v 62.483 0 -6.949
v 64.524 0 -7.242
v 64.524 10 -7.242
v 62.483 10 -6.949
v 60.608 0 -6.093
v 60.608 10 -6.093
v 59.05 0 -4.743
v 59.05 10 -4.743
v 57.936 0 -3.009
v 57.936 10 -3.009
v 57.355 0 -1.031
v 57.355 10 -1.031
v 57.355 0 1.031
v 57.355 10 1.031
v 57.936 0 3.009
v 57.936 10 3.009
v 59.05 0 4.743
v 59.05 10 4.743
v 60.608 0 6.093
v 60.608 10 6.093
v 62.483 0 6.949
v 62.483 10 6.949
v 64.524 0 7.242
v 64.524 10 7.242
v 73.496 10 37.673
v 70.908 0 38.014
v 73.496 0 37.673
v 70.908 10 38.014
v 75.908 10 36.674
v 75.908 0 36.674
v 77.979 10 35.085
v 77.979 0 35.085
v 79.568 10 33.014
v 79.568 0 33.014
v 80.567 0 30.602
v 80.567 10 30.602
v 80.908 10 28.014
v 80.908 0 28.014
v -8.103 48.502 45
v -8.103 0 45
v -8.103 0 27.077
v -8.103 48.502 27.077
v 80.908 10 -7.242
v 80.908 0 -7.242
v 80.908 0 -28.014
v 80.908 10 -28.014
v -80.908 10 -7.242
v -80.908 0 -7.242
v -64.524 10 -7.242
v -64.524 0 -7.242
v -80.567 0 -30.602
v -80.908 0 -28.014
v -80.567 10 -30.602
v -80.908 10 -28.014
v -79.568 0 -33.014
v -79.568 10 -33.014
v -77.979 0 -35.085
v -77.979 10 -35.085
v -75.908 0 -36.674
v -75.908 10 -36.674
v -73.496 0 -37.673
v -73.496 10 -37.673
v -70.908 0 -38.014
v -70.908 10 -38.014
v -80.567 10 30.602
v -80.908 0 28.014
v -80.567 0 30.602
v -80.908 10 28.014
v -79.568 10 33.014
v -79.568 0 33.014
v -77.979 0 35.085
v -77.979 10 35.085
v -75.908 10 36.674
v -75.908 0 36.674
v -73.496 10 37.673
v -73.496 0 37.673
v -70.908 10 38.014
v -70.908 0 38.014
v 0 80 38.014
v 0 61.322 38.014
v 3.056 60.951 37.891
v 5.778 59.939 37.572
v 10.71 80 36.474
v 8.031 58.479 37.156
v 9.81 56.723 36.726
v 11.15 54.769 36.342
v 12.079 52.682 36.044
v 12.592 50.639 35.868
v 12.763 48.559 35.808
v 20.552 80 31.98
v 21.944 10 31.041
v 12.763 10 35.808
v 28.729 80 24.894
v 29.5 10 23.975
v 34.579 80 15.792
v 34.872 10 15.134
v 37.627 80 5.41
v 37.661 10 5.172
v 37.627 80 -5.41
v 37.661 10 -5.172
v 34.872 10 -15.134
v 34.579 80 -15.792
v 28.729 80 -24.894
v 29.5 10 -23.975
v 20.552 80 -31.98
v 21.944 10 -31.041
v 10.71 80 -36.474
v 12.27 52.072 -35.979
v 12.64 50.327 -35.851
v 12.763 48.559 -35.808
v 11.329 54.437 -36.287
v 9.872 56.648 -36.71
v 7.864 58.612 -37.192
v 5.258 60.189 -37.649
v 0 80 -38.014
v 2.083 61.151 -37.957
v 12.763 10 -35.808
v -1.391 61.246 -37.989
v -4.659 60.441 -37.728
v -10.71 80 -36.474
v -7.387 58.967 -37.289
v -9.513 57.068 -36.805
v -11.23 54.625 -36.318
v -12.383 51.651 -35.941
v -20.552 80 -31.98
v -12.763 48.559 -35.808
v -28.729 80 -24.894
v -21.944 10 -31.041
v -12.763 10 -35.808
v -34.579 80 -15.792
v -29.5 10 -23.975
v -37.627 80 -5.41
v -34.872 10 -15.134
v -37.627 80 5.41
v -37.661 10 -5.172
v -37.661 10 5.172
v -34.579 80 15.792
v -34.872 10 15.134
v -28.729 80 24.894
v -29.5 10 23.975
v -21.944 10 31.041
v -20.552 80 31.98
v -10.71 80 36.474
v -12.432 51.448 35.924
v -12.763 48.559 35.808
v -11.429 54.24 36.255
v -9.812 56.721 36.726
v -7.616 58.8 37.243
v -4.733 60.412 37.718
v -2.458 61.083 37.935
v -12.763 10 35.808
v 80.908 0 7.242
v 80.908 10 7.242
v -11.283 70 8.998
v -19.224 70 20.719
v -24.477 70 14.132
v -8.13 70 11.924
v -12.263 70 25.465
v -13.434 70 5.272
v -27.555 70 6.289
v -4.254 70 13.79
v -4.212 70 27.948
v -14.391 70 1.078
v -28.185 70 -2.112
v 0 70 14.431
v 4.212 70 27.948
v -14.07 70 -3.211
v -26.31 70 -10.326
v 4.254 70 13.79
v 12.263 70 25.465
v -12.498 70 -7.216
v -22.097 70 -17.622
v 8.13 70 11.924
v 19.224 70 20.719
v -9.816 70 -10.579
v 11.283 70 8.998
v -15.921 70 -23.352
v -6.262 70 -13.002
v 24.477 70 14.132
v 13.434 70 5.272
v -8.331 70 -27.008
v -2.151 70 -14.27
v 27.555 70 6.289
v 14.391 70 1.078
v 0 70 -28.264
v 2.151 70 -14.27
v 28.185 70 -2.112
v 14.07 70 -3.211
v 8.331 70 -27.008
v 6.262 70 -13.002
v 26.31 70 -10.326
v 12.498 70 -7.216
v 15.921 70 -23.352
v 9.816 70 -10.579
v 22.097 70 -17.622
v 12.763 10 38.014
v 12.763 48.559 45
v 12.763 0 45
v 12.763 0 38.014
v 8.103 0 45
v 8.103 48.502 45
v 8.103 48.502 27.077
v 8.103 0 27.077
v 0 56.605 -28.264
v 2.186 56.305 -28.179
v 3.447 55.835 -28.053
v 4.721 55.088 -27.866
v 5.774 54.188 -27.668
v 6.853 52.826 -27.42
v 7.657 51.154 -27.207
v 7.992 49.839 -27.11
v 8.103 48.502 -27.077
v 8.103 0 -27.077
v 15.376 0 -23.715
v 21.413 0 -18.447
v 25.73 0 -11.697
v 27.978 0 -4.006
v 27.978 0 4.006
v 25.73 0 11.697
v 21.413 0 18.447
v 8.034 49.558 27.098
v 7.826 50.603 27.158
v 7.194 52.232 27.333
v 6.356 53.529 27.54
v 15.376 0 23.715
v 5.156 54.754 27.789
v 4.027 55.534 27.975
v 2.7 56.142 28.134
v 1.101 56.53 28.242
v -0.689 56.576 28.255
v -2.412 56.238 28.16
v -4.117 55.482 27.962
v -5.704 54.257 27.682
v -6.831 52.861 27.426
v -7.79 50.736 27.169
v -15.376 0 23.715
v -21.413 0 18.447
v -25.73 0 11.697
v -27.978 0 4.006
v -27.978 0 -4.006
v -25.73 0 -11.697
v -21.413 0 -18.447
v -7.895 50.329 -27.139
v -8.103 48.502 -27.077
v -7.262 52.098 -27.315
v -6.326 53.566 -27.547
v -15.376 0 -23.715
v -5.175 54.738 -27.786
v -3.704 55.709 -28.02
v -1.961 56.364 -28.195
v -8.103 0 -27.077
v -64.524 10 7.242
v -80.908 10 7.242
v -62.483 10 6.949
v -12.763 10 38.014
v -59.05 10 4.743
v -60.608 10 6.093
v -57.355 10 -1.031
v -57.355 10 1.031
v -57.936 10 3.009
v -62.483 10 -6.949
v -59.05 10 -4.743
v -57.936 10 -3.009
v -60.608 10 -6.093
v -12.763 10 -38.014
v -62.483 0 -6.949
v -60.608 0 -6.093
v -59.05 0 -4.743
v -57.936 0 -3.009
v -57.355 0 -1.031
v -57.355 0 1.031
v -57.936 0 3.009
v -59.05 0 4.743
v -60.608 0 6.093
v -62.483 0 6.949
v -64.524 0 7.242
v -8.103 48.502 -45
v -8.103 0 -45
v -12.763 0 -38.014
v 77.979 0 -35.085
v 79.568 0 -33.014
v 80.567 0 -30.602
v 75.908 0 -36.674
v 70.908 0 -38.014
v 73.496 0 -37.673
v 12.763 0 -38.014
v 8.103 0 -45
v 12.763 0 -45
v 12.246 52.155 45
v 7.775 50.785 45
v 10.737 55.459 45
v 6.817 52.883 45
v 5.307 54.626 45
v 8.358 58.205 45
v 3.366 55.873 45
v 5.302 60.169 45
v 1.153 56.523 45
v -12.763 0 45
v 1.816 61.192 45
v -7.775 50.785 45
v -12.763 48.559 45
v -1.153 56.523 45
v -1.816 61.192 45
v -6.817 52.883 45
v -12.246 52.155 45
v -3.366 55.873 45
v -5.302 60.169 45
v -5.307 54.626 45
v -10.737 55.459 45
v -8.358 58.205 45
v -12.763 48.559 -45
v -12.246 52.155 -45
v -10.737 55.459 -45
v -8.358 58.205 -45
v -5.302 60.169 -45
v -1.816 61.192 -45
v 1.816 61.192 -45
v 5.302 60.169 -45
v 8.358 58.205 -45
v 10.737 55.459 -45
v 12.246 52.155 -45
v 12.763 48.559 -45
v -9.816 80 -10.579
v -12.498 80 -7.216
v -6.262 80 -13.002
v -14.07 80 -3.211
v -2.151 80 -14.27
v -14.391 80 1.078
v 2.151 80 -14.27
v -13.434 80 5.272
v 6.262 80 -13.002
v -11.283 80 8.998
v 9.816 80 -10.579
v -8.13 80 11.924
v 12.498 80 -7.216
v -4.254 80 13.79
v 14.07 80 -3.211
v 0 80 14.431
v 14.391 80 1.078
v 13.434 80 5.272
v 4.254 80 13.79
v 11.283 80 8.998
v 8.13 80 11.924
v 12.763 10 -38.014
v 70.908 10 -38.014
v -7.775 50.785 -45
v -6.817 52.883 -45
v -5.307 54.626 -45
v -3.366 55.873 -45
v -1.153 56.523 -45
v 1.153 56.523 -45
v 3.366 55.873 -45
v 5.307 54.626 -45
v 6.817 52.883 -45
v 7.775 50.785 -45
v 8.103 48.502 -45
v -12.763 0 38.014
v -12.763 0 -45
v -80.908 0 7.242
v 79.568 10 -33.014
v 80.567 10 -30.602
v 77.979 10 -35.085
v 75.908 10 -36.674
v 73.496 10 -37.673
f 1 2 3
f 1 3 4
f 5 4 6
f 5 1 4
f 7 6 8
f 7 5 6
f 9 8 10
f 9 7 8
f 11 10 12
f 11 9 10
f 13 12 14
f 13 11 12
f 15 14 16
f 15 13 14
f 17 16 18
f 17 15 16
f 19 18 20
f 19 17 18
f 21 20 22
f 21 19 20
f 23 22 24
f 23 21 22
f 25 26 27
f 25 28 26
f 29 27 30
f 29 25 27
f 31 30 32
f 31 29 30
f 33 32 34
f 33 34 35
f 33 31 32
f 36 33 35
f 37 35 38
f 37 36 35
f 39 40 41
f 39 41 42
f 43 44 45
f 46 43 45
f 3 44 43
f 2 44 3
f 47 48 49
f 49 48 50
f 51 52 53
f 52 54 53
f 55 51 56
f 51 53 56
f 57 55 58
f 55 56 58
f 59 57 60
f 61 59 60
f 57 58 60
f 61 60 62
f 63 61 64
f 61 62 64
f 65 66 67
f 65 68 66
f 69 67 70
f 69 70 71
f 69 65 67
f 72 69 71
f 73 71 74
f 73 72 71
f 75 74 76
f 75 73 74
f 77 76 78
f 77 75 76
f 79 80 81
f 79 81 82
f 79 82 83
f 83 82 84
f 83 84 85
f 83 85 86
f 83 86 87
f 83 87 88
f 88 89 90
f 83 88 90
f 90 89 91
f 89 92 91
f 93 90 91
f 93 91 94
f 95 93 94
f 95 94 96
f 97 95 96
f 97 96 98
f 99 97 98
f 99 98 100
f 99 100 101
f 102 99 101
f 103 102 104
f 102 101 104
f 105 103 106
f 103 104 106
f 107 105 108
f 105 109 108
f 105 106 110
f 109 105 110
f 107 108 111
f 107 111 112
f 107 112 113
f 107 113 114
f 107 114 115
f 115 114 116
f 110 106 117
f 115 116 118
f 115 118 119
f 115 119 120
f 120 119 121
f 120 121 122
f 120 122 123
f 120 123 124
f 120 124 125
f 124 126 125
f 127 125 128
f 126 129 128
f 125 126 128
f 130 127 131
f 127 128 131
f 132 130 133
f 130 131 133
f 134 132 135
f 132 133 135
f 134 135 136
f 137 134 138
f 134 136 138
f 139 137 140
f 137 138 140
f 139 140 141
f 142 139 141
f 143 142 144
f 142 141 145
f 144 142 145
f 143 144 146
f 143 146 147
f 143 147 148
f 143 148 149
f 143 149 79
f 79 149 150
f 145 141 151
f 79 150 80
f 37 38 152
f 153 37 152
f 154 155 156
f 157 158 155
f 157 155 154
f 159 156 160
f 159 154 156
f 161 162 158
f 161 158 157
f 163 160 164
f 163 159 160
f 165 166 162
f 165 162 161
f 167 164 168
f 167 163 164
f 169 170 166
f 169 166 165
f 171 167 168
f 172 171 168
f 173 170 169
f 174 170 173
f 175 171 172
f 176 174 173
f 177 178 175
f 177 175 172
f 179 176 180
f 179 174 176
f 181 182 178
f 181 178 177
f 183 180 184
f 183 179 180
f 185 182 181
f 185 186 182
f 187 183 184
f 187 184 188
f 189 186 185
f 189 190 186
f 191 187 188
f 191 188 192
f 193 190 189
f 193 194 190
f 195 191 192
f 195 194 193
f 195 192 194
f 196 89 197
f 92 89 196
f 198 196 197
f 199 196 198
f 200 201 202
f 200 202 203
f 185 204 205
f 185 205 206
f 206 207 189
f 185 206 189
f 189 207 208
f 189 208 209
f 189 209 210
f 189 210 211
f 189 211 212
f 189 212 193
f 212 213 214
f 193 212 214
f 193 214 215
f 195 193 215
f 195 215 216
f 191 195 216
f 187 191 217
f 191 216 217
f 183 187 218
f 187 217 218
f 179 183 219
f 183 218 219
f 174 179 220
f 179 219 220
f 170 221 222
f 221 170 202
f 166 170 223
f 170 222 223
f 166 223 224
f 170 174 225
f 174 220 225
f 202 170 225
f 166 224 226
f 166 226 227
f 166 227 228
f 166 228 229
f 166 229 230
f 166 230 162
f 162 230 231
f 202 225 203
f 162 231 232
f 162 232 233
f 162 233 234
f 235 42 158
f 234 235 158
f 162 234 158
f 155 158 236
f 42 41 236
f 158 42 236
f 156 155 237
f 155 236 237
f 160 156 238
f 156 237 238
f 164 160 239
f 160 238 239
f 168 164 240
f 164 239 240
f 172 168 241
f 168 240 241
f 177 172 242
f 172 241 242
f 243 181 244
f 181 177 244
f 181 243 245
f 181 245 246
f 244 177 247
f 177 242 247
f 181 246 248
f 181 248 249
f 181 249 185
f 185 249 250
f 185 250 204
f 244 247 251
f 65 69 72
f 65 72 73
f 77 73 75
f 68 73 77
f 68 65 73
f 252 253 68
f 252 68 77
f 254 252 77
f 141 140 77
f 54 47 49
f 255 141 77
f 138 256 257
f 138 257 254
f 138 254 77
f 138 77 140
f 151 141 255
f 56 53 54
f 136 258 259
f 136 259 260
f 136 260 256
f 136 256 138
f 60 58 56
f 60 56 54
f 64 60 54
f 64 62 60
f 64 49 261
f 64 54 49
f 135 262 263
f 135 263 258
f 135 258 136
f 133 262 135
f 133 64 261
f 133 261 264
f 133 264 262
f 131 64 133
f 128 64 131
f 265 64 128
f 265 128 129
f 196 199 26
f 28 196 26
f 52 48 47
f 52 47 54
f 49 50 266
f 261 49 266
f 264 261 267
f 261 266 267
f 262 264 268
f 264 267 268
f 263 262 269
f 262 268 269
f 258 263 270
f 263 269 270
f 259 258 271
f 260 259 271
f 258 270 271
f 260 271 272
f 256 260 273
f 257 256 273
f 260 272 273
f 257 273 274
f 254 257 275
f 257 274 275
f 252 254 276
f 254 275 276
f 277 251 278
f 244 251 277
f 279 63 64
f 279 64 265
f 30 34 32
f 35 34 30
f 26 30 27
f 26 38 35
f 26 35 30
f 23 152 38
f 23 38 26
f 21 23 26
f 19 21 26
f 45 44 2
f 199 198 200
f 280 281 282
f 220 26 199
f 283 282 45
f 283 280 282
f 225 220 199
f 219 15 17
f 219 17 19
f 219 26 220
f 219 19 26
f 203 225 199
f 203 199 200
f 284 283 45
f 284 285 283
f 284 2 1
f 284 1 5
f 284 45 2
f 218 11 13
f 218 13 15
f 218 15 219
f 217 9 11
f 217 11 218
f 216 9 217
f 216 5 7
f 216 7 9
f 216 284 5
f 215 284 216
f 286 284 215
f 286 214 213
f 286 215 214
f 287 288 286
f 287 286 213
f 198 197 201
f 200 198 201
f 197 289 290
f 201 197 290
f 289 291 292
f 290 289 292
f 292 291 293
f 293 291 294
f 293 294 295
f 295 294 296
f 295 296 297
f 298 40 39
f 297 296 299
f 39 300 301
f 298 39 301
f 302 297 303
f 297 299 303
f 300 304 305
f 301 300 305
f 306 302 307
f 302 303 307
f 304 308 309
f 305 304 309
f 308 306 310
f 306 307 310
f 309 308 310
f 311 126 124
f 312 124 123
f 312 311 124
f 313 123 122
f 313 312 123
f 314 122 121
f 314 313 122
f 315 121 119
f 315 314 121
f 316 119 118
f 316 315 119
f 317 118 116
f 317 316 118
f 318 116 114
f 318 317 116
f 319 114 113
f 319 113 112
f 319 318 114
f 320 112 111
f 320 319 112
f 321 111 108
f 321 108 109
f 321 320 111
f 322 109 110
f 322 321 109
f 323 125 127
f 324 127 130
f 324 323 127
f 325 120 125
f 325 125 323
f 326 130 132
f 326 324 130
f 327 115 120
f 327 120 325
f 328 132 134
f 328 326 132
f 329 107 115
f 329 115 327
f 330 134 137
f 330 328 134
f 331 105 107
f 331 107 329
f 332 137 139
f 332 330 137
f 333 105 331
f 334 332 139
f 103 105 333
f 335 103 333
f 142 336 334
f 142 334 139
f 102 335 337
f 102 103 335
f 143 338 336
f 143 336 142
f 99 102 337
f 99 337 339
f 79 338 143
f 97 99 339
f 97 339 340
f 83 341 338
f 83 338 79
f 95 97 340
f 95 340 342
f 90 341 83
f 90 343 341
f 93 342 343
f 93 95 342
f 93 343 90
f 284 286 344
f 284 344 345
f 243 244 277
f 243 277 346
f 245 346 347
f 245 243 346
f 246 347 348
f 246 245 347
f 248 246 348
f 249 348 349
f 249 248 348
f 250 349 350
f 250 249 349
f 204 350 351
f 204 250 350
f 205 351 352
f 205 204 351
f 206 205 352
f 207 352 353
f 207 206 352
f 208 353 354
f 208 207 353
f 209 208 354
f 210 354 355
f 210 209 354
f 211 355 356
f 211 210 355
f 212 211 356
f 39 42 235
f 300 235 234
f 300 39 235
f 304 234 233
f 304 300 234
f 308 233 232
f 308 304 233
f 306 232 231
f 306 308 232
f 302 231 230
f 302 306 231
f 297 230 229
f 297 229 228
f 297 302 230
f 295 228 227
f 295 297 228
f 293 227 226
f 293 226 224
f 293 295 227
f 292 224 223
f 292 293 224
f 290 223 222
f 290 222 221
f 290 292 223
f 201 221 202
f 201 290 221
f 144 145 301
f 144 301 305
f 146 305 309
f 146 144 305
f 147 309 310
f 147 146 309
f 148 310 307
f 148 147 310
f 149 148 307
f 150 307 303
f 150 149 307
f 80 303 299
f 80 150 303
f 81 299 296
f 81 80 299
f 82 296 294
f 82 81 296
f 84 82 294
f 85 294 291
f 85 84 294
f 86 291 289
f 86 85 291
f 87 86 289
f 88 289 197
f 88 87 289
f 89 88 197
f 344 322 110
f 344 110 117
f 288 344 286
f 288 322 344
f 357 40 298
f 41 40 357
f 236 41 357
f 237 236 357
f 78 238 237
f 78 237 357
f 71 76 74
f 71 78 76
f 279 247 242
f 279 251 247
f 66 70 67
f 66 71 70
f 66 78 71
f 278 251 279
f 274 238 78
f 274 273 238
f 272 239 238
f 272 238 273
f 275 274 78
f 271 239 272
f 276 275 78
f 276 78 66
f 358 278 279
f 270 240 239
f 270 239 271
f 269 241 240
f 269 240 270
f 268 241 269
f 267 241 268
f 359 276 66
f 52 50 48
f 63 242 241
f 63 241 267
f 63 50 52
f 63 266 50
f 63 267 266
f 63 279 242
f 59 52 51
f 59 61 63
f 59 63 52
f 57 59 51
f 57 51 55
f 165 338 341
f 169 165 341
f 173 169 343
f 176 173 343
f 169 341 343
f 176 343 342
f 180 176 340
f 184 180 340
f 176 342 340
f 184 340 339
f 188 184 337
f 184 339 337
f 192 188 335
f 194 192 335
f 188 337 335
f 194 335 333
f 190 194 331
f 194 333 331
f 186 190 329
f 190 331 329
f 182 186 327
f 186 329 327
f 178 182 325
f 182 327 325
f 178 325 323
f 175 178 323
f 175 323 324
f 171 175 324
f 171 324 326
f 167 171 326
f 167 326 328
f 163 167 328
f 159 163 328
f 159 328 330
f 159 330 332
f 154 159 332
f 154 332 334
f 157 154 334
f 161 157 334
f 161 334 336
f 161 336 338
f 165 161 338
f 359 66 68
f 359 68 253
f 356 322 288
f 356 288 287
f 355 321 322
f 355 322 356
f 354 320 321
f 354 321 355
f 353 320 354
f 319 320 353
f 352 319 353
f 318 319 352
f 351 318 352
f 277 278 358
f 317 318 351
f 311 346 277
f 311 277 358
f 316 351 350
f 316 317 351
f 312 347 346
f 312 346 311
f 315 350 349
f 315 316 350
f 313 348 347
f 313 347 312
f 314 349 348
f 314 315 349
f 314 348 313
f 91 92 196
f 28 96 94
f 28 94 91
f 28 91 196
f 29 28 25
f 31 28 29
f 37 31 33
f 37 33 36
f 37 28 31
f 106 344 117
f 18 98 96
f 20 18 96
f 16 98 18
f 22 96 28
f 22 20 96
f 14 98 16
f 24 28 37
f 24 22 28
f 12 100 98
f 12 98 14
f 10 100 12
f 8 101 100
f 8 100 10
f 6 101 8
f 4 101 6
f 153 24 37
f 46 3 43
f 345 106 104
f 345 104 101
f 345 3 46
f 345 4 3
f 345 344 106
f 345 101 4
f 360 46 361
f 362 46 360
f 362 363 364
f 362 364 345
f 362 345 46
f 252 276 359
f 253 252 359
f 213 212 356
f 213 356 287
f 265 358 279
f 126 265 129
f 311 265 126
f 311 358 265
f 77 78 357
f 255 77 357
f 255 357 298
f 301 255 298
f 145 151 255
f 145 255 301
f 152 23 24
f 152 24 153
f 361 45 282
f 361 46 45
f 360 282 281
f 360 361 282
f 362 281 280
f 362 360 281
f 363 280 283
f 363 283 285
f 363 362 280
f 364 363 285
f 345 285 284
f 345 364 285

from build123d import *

# Parameters (mm, degrees)
SKETCH_1_W           = 161.815887324
SKETCH_1_H           = 76.02828169
EXTRUDE_1_DEPTH      = 10
FILLET_1_R           = 10
CUT_EXTRUDE_5_DEPTH  = 27
SKETCH_5_R           = 38.014140845
EXTRUDE_2_DEPTH      = 80
EXTRUDE_4_DEPTH      = 45
EXTRUDE_4_DEPTH_BACK = 45
CUT_EXTRUDE_6_DEPTH  = 119
SKETCH_11_R          = 28.263571039
CUT_EXTRUDE_8_DEPTH  = 70
SKETCH_12_R          = 14.431437431
CUT_EXTRUDE_9_DEPTH  = 70


with BuildPart() as part:
    # 草图1 → 凸台-拉伸1 (new body)
    with BuildSketch(Plane(origin=(0, 0, 0), x_dir=(1, 0, 0), z_dir=(0, 1, 0))):
        Rectangle(SKETCH_1_W, SKETCH_1_H)
    extrude(amount=EXTRUDE_1_DEPTH)

    # 圆角1
    fillet_1_edges = [part.edges().sort_by_distance(p)[0] for p in [
        (80.907943662, 5, 38.014140845),
        (-80.907943662, 5, 38.014140845),
        (-80.907943662, 5, -38.014140845),
        (80.907943662, 5, -38.014140845),
    ]]
    fillet(fillet_1_edges, radius=FILLET_1_R)

    # 草图4 → 切除-拉伸5 (cut)
    with BuildSketch(Plane(origin=(0, 0, 0), x_dir=(1, 0, 0), z_dir=(0, 1, 0))):
        with BuildLine():
            Line((-80.907943662, 7.242463814), (-64.523768529, 7.242463814))
            ThreePointArc((-64.523768529, 7.242463814), (-57.281304715, 0), (-64.523768529, -7.242463814))
            Line((-64.523768529, -7.242463814), (-80.907943662, -7.242463814))
            Line((-80.907943662, -7.242463814), (-80.907943662, 7.242463814))
        make_face()
    cut_extrude_5 = extrude(amount=CUT_EXTRUDE_5_DEPTH, mode=Mode.SUBTRACT)

    # 镜向7: 切除-拉伸5 across plane
    add(cut_extrude_5.mirror(Plane(origin=(0, 0, 0), x_dir=(0, 0, 1), z_dir=(1, 0, 0))), mode=Mode.SUBTRACT)

    # 草图5 → 凸台-拉伸2 (add)
    with BuildSketch(Plane(origin=(0, 0, 0), x_dir=(1, 0, 0), z_dir=(0, 1, 0))):
        with Locations(Location((0, 0, 0), (0, 0, 270))):
            Circle(SKETCH_5_R)
    extrude(amount=EXTRUDE_2_DEPTH)

    # 草图6 → 凸台-拉伸4 (add, two sides: drawn at the far end of the back side and taken through both)
    with BuildSketch(Plane.XY.offset(-EXTRUDE_4_DEPTH_BACK)):
        with BuildLine():
            Line((-12.762943226, 0), (-12.762943226, 48.559275417))
            ThreePointArc((-12.762943226, 48.559275417), (0, 61.322218643), (12.762943226, 48.559275417))
            Line((12.762943226, 48.559275417), (12.762943226, 0))
            Line((12.762943226, 0), (-12.762943226, 0))
        make_face()
    extrude(amount=EXTRUDE_4_DEPTH + EXTRUDE_4_DEPTH_BACK)

    # 草图9 → 切除-拉伸6 (cut)
    with BuildSketch(Plane.XY.offset(45)):
        with BuildLine():
            Line((-8.103456016, 0), (-8.103456016, 48.501805974))
            ThreePointArc((-8.103456016, 48.501805974), (0, 56.60526199), (8.103456016, 48.501805974))
            Line((8.103456016, 48.501805974), (8.103456016, 0))
            Line((8.103456016, 0), (-8.103456016, 0))
        make_face()
    extrude(amount=-CUT_EXTRUDE_6_DEPTH, mode=Mode.SUBTRACT)

    # 草图11 → 切除-拉伸8 (cut)
    with BuildSketch(Plane.XZ):
        with Locations(Location((0, 0, 0), (0, 0, 270))):
            Circle(SKETCH_11_R)
    extrude(amount=-CUT_EXTRUDE_8_DEPTH, mode=Mode.SUBTRACT)

    # 草图12 → 切除-拉伸9 (cut)
    with BuildSketch(Plane(origin=(0, 80, 0), x_dir=(1, 0, 0), z_dir=(0, 1, 0))):
        with Locations(Location((0, 0, 0), (0, 0, 270))):
            Circle(SKETCH_12_R)
    extrude(amount=-CUT_EXTRUDE_9_DEPTH, mode=Mode.SUBTRACT)


solid = part.part
